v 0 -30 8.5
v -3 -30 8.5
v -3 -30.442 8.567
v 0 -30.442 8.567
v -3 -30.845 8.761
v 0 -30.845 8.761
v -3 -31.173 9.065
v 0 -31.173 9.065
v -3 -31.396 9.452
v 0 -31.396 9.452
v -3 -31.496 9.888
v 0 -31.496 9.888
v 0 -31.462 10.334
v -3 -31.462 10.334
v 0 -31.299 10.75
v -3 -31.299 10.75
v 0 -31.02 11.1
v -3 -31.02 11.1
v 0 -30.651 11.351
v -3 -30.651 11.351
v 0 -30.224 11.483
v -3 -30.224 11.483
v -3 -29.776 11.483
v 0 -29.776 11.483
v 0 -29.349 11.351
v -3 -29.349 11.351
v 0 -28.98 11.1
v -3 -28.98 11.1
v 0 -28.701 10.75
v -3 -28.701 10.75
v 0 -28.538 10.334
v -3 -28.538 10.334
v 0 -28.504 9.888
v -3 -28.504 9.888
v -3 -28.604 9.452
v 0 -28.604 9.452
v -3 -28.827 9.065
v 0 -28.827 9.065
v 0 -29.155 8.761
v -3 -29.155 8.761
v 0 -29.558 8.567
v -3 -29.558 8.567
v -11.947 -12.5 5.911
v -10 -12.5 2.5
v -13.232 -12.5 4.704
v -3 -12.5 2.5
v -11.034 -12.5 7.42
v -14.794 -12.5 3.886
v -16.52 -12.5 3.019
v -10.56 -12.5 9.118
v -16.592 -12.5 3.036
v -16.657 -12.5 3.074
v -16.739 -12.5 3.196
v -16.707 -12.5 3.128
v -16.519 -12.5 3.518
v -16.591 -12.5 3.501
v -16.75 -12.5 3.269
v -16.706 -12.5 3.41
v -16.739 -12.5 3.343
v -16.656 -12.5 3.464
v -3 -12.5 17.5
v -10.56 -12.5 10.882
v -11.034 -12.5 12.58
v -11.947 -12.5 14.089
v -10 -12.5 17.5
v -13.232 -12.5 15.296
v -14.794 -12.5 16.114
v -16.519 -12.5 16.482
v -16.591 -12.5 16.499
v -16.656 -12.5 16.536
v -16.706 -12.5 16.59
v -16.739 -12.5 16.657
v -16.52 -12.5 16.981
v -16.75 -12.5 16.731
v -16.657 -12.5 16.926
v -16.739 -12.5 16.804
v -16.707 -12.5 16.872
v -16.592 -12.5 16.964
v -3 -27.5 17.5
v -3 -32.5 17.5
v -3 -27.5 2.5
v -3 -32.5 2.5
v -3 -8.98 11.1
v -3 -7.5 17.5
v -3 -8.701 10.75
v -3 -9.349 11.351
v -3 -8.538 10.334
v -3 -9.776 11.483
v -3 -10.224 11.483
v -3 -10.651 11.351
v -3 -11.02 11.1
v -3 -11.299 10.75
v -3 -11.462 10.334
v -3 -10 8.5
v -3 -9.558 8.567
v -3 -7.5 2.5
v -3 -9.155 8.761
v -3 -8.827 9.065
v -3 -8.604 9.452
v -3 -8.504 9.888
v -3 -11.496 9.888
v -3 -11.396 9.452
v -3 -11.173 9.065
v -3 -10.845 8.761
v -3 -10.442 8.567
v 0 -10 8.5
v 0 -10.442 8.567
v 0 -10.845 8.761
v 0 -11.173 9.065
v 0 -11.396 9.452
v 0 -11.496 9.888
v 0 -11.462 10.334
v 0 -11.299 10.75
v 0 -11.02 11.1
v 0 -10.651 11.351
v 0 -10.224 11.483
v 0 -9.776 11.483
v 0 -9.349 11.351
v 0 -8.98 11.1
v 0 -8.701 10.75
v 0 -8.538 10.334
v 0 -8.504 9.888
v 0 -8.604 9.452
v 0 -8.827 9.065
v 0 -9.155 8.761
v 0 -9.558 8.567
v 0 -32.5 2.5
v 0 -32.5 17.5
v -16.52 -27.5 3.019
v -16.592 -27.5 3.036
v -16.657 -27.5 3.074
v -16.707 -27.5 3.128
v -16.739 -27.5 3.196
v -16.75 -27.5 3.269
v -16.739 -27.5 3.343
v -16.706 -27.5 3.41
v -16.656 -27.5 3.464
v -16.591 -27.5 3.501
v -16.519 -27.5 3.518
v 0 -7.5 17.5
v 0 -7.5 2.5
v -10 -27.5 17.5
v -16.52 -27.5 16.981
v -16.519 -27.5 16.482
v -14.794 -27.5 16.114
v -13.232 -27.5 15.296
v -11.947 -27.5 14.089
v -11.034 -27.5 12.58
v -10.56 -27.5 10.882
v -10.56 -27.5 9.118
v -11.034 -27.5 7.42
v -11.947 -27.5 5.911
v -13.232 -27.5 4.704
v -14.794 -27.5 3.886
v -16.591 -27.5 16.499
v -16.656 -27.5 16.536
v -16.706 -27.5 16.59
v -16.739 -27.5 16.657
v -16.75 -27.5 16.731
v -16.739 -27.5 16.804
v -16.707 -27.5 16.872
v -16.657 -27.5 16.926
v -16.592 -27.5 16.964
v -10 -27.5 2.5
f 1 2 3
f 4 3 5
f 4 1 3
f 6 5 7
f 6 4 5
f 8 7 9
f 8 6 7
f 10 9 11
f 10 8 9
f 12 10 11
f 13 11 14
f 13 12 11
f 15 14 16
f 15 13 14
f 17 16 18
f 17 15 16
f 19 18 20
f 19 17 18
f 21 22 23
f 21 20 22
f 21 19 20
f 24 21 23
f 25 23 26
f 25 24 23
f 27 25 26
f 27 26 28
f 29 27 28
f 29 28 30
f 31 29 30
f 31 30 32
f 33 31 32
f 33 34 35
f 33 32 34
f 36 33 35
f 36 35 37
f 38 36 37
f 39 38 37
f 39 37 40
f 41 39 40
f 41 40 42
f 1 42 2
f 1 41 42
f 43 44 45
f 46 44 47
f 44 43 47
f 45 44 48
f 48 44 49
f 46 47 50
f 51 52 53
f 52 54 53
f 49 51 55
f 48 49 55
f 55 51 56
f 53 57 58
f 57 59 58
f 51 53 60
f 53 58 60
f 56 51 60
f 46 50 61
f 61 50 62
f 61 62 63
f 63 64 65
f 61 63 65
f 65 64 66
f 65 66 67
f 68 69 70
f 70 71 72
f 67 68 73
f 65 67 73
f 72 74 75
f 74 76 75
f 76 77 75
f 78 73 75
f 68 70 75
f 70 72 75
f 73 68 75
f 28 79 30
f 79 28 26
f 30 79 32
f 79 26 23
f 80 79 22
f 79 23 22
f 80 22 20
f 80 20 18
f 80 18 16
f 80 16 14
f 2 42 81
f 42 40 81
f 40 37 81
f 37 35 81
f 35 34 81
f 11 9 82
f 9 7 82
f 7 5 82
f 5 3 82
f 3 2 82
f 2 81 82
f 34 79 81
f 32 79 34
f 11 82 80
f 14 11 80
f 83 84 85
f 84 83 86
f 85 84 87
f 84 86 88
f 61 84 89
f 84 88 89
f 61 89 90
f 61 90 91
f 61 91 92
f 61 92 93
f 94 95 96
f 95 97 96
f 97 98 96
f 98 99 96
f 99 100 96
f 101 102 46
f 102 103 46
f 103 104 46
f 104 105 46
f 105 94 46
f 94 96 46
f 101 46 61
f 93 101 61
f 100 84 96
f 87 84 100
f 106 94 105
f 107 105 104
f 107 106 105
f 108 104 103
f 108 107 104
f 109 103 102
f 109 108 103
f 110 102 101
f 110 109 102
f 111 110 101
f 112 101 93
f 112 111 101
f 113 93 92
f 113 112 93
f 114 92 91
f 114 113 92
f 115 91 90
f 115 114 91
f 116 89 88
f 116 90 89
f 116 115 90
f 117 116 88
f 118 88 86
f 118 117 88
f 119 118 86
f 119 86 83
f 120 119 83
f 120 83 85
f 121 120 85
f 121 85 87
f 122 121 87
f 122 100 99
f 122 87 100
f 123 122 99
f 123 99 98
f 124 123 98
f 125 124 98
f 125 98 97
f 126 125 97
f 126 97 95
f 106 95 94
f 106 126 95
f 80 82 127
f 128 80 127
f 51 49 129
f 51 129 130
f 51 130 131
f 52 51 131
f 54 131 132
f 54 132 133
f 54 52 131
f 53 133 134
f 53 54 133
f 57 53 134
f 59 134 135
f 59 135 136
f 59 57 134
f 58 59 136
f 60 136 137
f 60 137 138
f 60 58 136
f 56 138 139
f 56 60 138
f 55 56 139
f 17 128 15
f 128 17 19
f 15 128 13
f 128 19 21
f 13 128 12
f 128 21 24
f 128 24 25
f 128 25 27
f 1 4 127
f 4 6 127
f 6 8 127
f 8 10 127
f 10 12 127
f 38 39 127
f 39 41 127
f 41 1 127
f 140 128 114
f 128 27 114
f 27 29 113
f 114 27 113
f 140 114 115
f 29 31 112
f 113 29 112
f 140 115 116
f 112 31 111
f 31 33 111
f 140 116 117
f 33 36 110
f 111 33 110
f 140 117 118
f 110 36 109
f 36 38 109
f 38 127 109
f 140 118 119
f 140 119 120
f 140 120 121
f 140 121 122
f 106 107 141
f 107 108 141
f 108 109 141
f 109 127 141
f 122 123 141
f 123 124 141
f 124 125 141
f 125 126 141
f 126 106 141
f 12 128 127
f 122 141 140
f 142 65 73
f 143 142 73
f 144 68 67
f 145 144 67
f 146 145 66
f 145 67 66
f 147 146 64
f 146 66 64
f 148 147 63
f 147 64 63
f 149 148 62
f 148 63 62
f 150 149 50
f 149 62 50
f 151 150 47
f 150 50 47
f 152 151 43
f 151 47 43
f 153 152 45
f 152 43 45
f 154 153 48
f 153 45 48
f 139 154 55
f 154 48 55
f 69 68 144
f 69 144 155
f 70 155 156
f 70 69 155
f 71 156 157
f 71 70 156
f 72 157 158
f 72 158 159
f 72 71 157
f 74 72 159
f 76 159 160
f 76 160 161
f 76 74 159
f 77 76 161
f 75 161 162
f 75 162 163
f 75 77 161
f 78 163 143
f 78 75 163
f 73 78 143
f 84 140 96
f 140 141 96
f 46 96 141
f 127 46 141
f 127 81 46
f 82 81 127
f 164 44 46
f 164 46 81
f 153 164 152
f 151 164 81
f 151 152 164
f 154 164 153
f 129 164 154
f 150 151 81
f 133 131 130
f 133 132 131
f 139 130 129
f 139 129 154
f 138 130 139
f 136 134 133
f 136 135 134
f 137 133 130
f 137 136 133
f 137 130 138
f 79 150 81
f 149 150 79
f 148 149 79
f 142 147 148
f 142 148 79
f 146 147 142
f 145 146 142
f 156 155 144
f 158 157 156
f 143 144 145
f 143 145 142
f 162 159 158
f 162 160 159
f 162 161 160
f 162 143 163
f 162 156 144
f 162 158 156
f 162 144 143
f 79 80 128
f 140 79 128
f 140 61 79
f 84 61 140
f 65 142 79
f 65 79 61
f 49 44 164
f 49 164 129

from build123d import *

# Parameters (mm, degrees)
SKETCH003_W     = 5
SKETCH003_H     = 25
SKETCH003_R     = 1.5
PAD001_DEPTH    = 10
SKETCH004_W     = 5
SKETCH004_H     = 5
POCKET002_DEPTH = 7
PAD009_DEPTH    = 5
PAD010_DEPTH    = 5
PAD011_DEPTH    = 15


with BuildPart() as part:
    # Sketch003 (on DatumPlane) → Pad001 (new body)
    with BuildSketch(Plane(origin=(0, 0, 0), x_dir=(0, 0, -1), z_dir=(-1, 0, 0))):
        with Locations((-10, 20)):
            Rectangle(SKETCH003_W, SKETCH003_H)
        with Locations((-10, 30)):
            Circle(SKETCH003_R, mode=Mode.SUBTRACT)
        with Locations((-10, 10)):
            Circle(SKETCH003_R, mode=Mode.SUBTRACT)
    extrude(amount=PAD001_DEPTH)

    # Sketch004 (on Face8 of Pad001) → Pocket002 (cut)
    with BuildSketch(Plane(origin=(-10, 0, 0), x_dir=(0, 0, -1), z_dir=(-1, 0, 0))):
        with Locations((-10, 30)):
            Rectangle(SKETCH004_W, SKETCH004_H)
        with Locations((-10, 10)):
            Rectangle(SKETCH004_W, SKETCH004_H)
    extrude(amount=-POCKET002_DEPTH, mode=Mode.SUBTRACT)

    # Pocket002 Face3 → Pad009 (add)
    with BuildSketch(Plane(origin=(-4.416667, -20, 7.5), x_dir=(0, -1, 0), z_dir=(0, 0, -1))):
        Polygon((-12.5, -4.416667), (12.5, -4.416667), (12.5, -1.416667), (7.5, -1.416667), (7.5, 5.583333), (-7.5, 5.583333), (-7.5, -1.416667), (-12.5, -1.416667), align=None)
    extrude(amount=PAD009_DEPTH)

    # Pad009 Face3 → Pad010 (add)
    with BuildSketch(Plane(origin=(-4.416667, -20, 12.5), x_dir=(0, 1, 0), z_dir=(0, 0, 1))):
        Polygon((-12.5, -4.416667), (12.5, -4.416667), (12.5, -1.416667), (7.5, -1.416667), (7.5, 5.583333), (-7.5, 5.583333), (-7.5, -1.416667), (-12.5, -1.416667), align=None)
    extrude(amount=PAD010_DEPTH)

    # Sketch020 (on Face11 of Pad010) → Pad011 (join)
    with BuildSketch(Plane(origin=(0, -12.5, 0), x_dir=(0, 0, -1), z_dir=(0, 1, 0))):
        with BuildLine():
            ThreePointArc((-16.482143, 16.518519), (-10, 10.5), (-3.517857, 16.518519))
            ThreePointArc((-3.019333, 16.519851), (-3.269212, 16.749999), (-3.517857, 16.518519))
            Line((-2.5, 10), (-3.019333, 16.519851))
            Line((-2.5, 10), (-10, 10))
            Line((-17.5, 10), (-10, 10))
            Line((-17.5, 10), (-16.980667, 16.519851))
            ThreePointArc((-16.482143, 16.518519), (-16.730788, 16.749999), (-16.980667, 16.519851))
        make_face()
    extrude(amount=-PAD011_DEPTH)


solid = part.part
